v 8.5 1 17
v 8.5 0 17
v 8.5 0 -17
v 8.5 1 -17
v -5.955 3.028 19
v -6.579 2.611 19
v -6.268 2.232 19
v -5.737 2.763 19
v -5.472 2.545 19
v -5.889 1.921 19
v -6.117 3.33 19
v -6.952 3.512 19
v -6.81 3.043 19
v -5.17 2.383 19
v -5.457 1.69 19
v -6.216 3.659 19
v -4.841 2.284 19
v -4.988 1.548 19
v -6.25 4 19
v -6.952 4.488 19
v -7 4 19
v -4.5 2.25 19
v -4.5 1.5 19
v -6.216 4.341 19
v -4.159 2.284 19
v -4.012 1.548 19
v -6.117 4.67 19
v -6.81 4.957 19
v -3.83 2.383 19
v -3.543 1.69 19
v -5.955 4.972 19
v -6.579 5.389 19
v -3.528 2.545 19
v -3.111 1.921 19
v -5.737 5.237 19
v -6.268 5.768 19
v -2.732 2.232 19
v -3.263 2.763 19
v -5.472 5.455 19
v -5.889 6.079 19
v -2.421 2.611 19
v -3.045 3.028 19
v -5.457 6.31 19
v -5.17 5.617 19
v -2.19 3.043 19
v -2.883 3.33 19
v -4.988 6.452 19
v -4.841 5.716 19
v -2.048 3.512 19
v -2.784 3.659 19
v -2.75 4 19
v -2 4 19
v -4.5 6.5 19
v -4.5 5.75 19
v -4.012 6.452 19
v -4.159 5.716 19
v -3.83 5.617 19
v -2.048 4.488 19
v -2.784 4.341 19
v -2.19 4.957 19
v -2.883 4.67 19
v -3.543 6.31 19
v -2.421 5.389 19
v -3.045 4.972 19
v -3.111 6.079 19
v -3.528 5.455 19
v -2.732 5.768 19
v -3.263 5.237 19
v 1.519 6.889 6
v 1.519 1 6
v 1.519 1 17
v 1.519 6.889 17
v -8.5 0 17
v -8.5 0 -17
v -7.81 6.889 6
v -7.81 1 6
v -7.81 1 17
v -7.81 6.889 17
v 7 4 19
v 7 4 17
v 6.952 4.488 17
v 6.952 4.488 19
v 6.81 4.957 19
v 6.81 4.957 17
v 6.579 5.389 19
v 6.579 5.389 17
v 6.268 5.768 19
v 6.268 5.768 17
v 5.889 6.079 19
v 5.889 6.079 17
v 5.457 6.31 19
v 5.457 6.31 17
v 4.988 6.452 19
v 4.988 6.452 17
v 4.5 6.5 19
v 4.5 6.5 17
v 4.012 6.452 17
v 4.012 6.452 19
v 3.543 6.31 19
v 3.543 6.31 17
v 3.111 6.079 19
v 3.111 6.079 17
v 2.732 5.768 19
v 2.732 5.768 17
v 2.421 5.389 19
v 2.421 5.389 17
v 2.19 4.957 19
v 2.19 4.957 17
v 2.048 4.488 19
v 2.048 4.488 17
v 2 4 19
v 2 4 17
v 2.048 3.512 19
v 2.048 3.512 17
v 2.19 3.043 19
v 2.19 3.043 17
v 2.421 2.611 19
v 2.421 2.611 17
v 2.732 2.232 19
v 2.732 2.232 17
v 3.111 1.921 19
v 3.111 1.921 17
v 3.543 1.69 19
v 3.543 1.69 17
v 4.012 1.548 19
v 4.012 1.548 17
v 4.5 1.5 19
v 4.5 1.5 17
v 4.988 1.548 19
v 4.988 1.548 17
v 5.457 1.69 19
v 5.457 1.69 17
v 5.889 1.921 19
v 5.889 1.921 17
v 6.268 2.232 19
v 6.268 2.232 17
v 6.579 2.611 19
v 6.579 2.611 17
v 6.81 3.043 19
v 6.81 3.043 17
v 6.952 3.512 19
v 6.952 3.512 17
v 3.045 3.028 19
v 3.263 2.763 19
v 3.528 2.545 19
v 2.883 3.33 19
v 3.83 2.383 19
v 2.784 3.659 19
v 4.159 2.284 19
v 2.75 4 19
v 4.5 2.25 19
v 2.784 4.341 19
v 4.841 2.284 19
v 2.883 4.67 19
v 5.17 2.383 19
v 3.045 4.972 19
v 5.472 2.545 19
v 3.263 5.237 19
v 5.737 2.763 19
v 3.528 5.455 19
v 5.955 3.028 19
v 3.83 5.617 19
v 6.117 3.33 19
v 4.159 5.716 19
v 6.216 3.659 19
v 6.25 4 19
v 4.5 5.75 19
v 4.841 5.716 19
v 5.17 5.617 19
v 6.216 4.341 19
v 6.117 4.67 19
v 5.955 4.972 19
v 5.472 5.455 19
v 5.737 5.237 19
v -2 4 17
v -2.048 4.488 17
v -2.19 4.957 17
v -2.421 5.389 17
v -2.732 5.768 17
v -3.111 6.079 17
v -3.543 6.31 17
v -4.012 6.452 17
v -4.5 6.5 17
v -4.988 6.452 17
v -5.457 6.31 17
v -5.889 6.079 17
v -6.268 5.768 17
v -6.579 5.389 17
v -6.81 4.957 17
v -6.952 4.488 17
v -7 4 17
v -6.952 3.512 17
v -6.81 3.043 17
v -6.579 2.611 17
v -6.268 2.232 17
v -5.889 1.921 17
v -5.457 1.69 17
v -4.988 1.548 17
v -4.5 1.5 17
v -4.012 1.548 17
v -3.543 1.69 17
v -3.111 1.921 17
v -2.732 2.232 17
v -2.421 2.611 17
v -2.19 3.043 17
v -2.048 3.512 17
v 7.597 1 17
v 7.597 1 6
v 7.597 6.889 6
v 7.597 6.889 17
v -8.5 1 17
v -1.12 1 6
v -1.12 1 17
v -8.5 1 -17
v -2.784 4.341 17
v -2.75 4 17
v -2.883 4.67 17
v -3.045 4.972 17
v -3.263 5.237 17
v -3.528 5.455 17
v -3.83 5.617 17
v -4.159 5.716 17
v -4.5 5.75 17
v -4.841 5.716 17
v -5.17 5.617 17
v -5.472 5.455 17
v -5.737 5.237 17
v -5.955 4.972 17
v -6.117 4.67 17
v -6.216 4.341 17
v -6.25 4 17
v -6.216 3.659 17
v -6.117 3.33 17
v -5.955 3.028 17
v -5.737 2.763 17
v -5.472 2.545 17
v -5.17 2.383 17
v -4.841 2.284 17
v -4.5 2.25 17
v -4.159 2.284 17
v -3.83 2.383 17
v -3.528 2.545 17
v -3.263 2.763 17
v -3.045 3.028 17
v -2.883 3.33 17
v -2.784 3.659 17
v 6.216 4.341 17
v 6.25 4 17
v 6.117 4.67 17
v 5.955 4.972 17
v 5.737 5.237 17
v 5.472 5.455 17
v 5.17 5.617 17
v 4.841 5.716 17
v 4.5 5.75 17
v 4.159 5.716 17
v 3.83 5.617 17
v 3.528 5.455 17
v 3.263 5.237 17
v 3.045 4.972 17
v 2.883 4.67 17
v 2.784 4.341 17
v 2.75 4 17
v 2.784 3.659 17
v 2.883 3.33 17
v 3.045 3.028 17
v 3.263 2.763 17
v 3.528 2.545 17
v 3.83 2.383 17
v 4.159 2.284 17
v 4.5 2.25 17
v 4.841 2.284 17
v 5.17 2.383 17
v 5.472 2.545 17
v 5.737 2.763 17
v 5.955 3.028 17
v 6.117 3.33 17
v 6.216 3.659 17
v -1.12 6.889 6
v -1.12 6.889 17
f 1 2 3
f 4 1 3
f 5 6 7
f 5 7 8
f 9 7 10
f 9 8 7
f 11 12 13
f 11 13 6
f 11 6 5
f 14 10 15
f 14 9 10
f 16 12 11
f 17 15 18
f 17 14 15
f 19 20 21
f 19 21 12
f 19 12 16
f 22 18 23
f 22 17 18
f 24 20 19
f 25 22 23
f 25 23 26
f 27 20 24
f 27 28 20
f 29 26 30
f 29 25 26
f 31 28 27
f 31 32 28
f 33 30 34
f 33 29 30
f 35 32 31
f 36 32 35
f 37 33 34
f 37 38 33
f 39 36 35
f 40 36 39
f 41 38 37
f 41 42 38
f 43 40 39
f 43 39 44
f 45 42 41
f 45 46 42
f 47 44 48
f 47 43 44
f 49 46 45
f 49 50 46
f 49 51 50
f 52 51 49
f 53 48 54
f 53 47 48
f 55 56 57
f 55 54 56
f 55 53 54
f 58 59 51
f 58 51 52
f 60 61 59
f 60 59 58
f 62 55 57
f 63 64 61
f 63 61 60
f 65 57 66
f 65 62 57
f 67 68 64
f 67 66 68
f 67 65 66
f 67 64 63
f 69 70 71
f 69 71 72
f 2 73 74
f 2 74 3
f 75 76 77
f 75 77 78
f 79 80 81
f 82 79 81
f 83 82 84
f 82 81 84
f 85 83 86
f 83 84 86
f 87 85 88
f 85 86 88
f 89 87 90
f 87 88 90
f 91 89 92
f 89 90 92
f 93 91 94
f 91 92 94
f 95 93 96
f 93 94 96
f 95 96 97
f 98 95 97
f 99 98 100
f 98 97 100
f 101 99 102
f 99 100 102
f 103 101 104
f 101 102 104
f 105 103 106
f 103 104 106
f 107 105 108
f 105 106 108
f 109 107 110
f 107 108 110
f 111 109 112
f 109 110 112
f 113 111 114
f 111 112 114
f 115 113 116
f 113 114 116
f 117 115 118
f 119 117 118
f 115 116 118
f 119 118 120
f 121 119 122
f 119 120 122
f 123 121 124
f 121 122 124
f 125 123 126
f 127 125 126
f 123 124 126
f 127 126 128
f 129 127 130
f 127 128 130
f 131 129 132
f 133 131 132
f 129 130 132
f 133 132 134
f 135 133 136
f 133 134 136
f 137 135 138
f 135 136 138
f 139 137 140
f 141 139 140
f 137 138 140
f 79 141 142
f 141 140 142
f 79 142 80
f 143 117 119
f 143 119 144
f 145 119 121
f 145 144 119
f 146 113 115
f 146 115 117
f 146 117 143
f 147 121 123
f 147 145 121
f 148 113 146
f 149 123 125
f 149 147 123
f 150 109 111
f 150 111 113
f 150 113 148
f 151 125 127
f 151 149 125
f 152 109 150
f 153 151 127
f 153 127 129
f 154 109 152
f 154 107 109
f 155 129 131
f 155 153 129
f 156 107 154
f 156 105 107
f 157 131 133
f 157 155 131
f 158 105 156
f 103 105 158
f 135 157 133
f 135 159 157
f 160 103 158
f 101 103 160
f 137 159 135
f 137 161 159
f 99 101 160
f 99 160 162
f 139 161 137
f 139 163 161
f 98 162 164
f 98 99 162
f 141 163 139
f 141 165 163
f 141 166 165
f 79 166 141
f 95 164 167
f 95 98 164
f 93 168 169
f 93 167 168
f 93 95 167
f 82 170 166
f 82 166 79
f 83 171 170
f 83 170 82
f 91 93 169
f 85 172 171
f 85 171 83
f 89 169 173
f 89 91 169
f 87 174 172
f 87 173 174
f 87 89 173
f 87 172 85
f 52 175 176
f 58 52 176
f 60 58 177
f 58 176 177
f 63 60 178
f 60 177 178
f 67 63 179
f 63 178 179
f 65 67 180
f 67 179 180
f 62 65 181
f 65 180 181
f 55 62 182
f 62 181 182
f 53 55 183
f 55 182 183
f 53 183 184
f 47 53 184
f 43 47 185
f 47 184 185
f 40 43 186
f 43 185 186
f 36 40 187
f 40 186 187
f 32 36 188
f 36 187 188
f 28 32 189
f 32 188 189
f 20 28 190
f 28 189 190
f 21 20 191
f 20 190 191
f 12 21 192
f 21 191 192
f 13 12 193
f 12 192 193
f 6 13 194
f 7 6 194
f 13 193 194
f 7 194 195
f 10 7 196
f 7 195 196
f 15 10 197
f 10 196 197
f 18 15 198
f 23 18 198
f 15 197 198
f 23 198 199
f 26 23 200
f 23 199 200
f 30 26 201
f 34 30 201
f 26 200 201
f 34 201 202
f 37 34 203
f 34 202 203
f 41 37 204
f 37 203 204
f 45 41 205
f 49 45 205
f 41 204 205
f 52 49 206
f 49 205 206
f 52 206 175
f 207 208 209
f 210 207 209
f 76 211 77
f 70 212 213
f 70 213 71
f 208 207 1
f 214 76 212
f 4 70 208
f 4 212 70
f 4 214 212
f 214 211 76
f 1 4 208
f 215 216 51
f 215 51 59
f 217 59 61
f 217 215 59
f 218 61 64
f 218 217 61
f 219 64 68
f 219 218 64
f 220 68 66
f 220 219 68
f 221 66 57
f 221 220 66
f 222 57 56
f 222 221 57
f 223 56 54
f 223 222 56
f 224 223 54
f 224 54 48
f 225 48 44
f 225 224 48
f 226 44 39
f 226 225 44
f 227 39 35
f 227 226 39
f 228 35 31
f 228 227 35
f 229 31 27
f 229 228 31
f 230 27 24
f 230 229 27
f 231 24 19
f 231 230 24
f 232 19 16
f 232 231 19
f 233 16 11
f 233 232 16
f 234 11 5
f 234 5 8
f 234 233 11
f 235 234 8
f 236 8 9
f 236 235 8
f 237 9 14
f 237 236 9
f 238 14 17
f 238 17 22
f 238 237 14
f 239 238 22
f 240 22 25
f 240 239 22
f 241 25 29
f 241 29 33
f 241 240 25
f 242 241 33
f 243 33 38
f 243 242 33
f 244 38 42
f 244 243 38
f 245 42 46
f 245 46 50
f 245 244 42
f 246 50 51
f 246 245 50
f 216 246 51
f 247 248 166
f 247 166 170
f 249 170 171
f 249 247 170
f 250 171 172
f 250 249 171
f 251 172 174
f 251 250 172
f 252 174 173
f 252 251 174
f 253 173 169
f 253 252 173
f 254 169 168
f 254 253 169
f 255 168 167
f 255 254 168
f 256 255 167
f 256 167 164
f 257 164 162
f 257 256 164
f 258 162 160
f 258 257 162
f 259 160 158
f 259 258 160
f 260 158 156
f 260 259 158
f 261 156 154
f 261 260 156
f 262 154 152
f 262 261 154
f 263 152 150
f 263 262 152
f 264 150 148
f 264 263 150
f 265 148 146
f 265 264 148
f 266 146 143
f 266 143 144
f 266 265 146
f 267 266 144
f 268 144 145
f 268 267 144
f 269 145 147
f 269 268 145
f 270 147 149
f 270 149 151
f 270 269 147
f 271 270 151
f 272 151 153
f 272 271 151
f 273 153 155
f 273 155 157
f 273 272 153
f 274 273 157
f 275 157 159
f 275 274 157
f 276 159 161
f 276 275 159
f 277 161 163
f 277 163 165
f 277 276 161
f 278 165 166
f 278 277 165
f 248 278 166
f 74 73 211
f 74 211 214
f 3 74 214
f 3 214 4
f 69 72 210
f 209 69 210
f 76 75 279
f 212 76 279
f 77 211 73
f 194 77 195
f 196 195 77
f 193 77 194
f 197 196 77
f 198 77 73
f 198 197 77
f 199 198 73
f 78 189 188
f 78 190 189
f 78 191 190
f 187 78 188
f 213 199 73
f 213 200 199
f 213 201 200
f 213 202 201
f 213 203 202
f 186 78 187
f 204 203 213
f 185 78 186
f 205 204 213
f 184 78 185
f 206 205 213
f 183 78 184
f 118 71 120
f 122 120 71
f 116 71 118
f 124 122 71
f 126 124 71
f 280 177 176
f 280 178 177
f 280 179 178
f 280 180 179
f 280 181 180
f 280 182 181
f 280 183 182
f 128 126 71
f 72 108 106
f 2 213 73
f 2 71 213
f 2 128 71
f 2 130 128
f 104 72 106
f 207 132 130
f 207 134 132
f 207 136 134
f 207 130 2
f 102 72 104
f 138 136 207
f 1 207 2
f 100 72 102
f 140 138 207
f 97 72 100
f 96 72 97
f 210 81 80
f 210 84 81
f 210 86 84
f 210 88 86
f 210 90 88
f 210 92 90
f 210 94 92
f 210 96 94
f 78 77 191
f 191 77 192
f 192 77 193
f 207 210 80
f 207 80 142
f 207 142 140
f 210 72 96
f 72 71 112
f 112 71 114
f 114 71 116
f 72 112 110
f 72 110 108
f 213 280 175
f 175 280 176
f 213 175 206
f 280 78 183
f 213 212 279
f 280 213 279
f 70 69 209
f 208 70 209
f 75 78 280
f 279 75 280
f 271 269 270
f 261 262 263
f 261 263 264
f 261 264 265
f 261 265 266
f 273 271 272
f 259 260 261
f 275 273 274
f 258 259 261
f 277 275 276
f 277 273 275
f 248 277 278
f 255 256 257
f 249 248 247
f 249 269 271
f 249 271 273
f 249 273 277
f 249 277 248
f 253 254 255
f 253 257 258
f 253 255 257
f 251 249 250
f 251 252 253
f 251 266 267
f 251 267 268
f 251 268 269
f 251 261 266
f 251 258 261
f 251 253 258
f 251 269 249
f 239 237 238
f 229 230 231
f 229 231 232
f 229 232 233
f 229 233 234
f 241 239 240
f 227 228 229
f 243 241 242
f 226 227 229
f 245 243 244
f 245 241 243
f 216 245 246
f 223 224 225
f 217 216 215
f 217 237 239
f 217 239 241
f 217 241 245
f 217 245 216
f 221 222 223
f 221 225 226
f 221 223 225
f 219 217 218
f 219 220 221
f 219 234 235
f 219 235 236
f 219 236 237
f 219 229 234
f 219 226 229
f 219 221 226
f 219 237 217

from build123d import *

# Parameters (mm, degrees)
IZIM1_W                       = 17
IZIM1_H                       = 34
Y_KSEKLIK_EKSTR_ZYON1_DEPTH   = 1
IZIM2_R                       = 2.5
IZIM2_R_2                     = 1.75
Y_KSEKLIK_EKSTR_ZYON2_DEPTH   = 2
Y_KSEKLIK_EKSTR_ZYON2_2_DEPTH = 2
IZIM3_W                       = 6.690686046
IZIM3_H                       = 5.888560339
IZIM3_W_2                     = 6.077595292
Y_KSEKLIK_EKSTR_ZYON3_DEPTH   = 11


with BuildPart() as part:
    # Çizim1 → Yükseklik-Ekstrüzyon1 (new body)
    with BuildSketch(Plane(origin=(0, 0, 0), x_dir=(1, 0, 0), z_dir=(0, 1, 0))):
        Rectangle(IZIM1_W, IZIM1_H)
    extrude(amount=Y_KSEKLIK_EKSTR_ZYON1_DEPTH)



with BuildPart() as body_2:
    # Çizim2 → Yükseklik-Ekstrüzyon2 (new body)
    with BuildSketch(Plane.XY.offset(17)):
        with Locations((-4.5, 4)):
            Circle(IZIM2_R)
        with Locations((-4.5, 4)):
            Circle(IZIM2_R_2, mode=Mode.SUBTRACT)
    extrude(amount=Y_KSEKLIK_EKSTR_ZYON2_DEPTH)


with BuildPart() as body_3:
    # Çizim2 → Y_kseklik-Ekstr_zyon2 2 (new body)
    with BuildSketch(Plane.XY.offset(17)):
        with Locations((4.5, 4)):
            Circle(IZIM2_R)
        with Locations((4.5, 4)):
            Circle(IZIM2_R_2, mode=Mode.SUBTRACT)
    extrude(amount=Y_KSEKLIK_EKSTR_ZYON2_2_DEPTH)


with BuildPart() as part_1:
    add(part.part)

    add(body_2.part)  # Yükseklik-Ekstrüzyon3 merges body 2

    add(body_3.part)  # Yükseklik-Ekstrüzyon3 merges body 3
    # Çizim3 → Yükseklik-Ekstrüzyon3 (add)
    with BuildSketch(Plane.XY.offset(17)):
        with Locations((-4.46490005, 3.94428017)):
            Rectangle(IZIM3_W, IZIM3_H)
        with Locations((4.558196469, 3.94428017)):
            Rectangle(IZIM3_W_2, IZIM3_H)
    extrude(amount=-Y_KSEKLIK_EKSTR_ZYON3_DEPTH)


solid = part_1.part
